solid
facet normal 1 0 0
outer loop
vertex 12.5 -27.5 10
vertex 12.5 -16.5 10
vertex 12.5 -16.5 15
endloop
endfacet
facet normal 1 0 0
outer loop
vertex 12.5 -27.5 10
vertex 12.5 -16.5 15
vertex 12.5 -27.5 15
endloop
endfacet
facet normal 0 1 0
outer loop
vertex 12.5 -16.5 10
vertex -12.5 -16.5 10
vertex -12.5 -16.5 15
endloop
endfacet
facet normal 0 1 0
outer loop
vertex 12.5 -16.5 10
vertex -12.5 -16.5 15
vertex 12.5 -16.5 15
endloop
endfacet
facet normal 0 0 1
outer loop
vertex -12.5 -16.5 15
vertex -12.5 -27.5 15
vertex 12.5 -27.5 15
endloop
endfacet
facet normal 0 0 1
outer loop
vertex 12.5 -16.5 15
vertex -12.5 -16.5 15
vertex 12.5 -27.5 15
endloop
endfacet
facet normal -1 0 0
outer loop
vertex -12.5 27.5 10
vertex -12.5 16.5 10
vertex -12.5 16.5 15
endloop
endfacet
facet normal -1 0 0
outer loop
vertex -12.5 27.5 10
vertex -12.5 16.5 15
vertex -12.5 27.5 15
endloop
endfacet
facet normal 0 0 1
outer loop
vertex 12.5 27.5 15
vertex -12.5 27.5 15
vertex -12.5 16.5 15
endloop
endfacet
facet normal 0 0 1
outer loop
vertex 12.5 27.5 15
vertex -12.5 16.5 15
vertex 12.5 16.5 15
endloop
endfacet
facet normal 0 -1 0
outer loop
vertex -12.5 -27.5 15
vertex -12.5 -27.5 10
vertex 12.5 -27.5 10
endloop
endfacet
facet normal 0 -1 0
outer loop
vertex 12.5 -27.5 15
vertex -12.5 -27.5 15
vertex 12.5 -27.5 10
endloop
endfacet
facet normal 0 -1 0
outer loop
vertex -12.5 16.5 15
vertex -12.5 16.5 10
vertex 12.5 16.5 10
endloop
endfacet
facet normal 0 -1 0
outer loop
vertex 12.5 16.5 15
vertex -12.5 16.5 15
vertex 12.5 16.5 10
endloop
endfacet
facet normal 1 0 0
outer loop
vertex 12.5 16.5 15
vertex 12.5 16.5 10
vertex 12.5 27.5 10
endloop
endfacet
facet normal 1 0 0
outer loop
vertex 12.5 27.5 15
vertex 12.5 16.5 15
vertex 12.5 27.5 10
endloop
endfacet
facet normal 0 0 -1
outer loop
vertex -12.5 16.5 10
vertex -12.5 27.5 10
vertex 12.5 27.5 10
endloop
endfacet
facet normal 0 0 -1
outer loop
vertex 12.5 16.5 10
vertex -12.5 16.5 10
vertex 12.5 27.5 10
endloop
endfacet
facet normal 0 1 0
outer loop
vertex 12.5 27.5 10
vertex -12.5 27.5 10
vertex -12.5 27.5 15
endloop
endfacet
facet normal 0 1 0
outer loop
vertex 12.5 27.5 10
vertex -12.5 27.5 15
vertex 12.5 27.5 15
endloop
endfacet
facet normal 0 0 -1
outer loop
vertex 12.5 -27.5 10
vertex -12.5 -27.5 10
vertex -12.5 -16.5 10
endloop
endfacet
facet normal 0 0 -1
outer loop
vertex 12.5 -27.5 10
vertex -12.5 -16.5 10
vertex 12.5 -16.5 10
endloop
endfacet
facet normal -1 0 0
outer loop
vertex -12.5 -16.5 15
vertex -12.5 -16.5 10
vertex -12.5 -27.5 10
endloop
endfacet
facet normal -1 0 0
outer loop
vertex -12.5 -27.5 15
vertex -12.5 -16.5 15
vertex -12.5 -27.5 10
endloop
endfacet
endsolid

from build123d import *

# Parameters (mm, degrees)
BOX009005_W     = 25
BOX009005_H     = 11
BOX009005_DEPTH = 5
BOX009004_W     = 25
BOX009004_H     = 11
BOX009004_DEPTH = 5


with BuildPart() as long_magnet002:
    # Box009005 → Box009005 (new body)
    with BuildSketch(Plane(origin=(-12.5, 16.5, 10), x_dir=(1, 0, 0), z_dir=(0, 0, 1))):
        with Locations((12.5, 5.5)):
            Rectangle(BOX009005_W, BOX009005_H)
    extrude(amount=BOX009005_DEPTH)


with BuildPart() as part_mirroring:
    # Part__Mirroring: instance of Long Magnet002
    add(long_magnet002.part.mirror(Plane(origin=(0, 0, 0), x_dir=(1, 0, 0), z_dir=(0, 1, 0))))


with BuildPart() as stationary_keepers:
    # Box009004 → Box009004 (new body)
    with BuildSketch(Plane(origin=(-12.5, 16.5, 10), x_dir=(1, 0, 0), z_dir=(0, 0, 1))):
        with Locations((12.5, 5.5)):
            Rectangle(BOX009004_W, BOX009004_H)
    extrude(amount=BOX009004_DEPTH)

    # Fusion004: union Part__Mirroring
    add(part_mirroring.part)


solid = stationary_keepers.part
